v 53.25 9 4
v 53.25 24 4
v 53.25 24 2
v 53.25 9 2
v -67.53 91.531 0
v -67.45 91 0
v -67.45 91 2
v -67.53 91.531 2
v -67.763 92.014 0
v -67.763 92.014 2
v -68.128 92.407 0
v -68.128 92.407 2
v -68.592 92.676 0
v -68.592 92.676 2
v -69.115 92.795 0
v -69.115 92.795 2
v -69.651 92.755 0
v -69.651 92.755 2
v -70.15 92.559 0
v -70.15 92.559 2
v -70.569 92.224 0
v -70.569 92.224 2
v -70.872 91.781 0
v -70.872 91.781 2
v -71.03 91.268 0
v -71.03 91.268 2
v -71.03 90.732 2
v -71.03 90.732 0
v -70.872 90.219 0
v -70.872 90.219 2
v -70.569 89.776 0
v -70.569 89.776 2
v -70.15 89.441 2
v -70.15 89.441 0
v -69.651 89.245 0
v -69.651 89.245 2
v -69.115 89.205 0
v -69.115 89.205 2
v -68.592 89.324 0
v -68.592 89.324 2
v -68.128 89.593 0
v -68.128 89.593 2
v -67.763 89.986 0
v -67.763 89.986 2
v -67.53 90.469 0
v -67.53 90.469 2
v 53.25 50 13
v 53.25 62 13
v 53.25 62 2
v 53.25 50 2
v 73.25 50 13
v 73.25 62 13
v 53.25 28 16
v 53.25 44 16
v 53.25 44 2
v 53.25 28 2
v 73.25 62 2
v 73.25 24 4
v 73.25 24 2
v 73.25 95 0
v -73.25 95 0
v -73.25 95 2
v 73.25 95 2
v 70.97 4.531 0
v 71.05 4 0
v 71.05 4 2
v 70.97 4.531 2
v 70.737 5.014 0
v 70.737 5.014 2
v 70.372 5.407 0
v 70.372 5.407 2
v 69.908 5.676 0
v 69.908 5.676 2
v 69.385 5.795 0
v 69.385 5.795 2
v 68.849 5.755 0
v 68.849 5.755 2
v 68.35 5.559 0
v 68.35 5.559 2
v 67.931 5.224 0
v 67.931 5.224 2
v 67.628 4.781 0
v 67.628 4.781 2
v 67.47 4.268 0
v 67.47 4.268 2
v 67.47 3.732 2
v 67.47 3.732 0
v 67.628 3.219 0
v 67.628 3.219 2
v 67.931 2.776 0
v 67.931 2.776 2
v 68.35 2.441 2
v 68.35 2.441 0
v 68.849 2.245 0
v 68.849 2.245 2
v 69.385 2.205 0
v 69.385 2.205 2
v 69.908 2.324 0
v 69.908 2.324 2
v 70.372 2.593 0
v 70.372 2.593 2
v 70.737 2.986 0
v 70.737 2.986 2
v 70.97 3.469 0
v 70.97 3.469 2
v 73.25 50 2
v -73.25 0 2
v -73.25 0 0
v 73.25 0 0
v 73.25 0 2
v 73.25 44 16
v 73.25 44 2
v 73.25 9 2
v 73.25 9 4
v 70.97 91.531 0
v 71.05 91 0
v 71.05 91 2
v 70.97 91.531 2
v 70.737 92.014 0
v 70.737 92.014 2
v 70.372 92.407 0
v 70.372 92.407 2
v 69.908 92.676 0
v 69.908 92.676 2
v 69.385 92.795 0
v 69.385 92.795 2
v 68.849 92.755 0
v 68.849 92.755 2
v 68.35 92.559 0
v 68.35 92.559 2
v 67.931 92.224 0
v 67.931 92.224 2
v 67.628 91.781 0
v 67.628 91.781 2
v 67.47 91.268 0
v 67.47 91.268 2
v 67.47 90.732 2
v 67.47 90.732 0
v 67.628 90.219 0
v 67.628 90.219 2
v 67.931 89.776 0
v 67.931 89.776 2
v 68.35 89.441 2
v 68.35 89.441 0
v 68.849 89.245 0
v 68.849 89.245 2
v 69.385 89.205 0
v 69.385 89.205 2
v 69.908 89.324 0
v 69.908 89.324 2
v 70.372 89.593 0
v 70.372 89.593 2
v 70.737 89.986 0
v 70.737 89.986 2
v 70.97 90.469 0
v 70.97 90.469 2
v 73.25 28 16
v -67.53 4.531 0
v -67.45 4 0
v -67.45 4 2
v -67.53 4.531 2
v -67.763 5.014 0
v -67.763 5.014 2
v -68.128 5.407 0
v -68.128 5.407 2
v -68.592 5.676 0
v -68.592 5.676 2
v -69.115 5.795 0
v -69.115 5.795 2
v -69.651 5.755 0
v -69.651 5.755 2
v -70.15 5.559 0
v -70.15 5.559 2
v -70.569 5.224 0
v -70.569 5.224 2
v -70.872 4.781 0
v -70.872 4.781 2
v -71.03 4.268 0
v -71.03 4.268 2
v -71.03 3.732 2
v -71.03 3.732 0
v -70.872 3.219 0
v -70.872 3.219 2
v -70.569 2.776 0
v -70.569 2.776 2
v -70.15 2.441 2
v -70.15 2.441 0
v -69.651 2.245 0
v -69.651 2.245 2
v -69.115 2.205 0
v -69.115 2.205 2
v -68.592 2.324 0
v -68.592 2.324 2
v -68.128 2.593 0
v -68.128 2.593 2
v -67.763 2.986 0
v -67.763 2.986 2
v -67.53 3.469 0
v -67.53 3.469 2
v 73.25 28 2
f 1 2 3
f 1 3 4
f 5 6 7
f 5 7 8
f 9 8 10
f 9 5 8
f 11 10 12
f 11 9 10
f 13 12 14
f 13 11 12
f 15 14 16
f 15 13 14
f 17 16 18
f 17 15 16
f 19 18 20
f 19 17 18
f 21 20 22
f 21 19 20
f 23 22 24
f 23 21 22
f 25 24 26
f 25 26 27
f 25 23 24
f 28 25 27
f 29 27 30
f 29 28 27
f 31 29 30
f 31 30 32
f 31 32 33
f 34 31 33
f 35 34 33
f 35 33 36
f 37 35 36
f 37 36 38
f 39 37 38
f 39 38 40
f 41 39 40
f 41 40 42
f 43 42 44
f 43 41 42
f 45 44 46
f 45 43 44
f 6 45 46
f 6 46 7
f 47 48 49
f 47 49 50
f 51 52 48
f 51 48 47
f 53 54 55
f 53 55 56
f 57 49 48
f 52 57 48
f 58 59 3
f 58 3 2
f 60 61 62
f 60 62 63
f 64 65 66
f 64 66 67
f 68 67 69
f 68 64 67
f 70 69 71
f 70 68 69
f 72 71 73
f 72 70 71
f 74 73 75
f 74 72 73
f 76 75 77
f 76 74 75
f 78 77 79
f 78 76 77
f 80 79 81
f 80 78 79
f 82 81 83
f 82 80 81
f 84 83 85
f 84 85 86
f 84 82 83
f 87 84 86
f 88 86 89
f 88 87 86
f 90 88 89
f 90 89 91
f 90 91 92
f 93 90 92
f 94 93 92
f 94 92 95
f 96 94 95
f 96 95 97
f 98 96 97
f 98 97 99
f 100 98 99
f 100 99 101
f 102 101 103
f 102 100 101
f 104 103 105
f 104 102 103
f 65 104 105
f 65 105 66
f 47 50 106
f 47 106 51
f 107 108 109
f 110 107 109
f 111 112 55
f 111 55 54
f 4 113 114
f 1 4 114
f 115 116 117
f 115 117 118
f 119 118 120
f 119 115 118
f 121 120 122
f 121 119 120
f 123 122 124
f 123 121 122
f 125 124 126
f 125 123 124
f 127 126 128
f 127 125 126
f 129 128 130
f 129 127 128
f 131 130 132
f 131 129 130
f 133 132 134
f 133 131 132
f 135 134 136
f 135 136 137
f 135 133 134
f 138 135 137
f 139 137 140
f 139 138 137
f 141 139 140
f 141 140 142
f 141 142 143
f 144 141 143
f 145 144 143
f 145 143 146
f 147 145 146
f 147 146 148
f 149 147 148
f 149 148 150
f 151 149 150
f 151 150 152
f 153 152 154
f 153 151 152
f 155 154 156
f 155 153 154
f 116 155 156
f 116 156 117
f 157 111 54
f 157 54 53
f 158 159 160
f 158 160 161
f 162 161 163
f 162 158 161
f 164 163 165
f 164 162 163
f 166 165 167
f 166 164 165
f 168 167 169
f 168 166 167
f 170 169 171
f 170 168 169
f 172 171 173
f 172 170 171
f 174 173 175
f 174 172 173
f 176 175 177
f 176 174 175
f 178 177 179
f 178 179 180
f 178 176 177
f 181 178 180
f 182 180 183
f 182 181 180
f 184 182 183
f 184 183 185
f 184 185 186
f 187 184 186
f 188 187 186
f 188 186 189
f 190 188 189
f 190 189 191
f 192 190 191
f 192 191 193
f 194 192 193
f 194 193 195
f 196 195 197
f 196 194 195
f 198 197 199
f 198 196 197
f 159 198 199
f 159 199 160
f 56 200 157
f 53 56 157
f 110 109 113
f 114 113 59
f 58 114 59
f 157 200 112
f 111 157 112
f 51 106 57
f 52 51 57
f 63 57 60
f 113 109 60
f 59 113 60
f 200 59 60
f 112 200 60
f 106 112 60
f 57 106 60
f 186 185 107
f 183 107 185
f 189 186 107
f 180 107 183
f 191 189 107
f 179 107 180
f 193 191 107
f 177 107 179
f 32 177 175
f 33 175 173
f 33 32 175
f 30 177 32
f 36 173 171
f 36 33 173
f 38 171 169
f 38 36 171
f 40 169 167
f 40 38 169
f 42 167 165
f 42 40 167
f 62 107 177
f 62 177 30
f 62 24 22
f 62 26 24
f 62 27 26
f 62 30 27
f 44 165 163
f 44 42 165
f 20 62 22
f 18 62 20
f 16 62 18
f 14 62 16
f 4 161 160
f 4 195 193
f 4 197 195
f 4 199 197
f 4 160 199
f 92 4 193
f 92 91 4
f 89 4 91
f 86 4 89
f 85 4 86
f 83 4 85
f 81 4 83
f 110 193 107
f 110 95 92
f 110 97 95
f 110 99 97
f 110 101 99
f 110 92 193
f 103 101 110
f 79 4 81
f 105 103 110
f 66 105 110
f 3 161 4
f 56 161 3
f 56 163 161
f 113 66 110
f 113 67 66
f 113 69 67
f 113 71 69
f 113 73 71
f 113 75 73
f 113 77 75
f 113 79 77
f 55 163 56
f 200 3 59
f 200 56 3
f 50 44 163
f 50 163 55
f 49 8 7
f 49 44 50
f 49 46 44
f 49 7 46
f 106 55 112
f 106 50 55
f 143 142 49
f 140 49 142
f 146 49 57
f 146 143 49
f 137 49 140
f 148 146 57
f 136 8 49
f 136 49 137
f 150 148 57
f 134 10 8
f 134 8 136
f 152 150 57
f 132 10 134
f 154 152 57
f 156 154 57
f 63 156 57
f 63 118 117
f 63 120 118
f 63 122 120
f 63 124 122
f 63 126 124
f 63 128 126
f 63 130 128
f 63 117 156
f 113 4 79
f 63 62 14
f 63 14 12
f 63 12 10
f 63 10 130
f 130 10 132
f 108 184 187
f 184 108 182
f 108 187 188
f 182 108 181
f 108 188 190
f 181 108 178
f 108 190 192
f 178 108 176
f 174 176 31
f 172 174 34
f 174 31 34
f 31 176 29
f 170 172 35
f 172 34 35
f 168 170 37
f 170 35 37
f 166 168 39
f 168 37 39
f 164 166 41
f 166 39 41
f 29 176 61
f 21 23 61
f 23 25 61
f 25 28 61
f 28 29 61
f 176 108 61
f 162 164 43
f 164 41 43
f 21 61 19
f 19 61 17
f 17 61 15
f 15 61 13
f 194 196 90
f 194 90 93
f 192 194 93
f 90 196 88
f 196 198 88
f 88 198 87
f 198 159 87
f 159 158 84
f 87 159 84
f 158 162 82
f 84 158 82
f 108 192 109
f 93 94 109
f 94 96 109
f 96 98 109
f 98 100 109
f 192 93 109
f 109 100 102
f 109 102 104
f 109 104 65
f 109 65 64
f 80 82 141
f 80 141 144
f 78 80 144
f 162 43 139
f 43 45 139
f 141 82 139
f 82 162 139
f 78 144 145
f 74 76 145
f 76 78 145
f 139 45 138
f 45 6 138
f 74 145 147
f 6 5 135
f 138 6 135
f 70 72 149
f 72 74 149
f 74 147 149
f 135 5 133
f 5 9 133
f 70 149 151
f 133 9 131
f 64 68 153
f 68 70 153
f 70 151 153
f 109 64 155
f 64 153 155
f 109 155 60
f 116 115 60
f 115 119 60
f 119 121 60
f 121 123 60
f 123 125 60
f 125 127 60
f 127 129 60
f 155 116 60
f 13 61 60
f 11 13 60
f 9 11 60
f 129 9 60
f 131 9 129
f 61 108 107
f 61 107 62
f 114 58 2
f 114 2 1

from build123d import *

# Parameters (mm, degrees)
SKETCH001_W   = 15
SKETCH001_H   = 2
SKETCH001_W_2 = 16
SKETCH001_H_2 = 14
SKETCH001_W_3 = 12
SKETCH001_H_3 = 11
PAD001_DEPTH  = 20
SKETCH_W      = 146.5
SKETCH_H      = 95
SKETCH_R      = 1.8
PAD_DEPTH     = 2


with BuildPart() as pad001:
    # Sketch001 → Pad001 (new body)
    with BuildSketch(Plane(origin=(73.25, 0, 0), x_dir=(0, -1, 0), z_dir=(-1, 0, 0))):
        with Locations((-16.5, 3)):
            Rectangle(SKETCH001_W, SKETCH001_H)
        with Locations((-36, 9)):
            Rectangle(SKETCH001_W_2, SKETCH001_H_2)
        with Locations((-56, 7.5)):
            Rectangle(SKETCH001_W_3, SKETCH001_H_3)
    extrude(amount=PAD001_DEPTH)


with BuildPart() as fusion:
    # Sketch → Pad (new body)
    with BuildSketch(Plane.XY):
        with Locations((0, 47.5)):
            Rectangle(SKETCH_W, SKETCH_H)
        with Locations((-69.25, 91)):
            Circle(SKETCH_R, mode=Mode.SUBTRACT)
        with Locations((69.25, 91)):
            Circle(SKETCH_R, mode=Mode.SUBTRACT)
        with Locations((69.25, 4)):
            Circle(SKETCH_R, mode=Mode.SUBTRACT)
        with Locations((-69.25, 4)):
            Circle(SKETCH_R, mode=Mode.SUBTRACT)
    extrude(amount=PAD_DEPTH)

    # Fusion: union Pad001
    add(pad001.part)


solid = fusion.part
